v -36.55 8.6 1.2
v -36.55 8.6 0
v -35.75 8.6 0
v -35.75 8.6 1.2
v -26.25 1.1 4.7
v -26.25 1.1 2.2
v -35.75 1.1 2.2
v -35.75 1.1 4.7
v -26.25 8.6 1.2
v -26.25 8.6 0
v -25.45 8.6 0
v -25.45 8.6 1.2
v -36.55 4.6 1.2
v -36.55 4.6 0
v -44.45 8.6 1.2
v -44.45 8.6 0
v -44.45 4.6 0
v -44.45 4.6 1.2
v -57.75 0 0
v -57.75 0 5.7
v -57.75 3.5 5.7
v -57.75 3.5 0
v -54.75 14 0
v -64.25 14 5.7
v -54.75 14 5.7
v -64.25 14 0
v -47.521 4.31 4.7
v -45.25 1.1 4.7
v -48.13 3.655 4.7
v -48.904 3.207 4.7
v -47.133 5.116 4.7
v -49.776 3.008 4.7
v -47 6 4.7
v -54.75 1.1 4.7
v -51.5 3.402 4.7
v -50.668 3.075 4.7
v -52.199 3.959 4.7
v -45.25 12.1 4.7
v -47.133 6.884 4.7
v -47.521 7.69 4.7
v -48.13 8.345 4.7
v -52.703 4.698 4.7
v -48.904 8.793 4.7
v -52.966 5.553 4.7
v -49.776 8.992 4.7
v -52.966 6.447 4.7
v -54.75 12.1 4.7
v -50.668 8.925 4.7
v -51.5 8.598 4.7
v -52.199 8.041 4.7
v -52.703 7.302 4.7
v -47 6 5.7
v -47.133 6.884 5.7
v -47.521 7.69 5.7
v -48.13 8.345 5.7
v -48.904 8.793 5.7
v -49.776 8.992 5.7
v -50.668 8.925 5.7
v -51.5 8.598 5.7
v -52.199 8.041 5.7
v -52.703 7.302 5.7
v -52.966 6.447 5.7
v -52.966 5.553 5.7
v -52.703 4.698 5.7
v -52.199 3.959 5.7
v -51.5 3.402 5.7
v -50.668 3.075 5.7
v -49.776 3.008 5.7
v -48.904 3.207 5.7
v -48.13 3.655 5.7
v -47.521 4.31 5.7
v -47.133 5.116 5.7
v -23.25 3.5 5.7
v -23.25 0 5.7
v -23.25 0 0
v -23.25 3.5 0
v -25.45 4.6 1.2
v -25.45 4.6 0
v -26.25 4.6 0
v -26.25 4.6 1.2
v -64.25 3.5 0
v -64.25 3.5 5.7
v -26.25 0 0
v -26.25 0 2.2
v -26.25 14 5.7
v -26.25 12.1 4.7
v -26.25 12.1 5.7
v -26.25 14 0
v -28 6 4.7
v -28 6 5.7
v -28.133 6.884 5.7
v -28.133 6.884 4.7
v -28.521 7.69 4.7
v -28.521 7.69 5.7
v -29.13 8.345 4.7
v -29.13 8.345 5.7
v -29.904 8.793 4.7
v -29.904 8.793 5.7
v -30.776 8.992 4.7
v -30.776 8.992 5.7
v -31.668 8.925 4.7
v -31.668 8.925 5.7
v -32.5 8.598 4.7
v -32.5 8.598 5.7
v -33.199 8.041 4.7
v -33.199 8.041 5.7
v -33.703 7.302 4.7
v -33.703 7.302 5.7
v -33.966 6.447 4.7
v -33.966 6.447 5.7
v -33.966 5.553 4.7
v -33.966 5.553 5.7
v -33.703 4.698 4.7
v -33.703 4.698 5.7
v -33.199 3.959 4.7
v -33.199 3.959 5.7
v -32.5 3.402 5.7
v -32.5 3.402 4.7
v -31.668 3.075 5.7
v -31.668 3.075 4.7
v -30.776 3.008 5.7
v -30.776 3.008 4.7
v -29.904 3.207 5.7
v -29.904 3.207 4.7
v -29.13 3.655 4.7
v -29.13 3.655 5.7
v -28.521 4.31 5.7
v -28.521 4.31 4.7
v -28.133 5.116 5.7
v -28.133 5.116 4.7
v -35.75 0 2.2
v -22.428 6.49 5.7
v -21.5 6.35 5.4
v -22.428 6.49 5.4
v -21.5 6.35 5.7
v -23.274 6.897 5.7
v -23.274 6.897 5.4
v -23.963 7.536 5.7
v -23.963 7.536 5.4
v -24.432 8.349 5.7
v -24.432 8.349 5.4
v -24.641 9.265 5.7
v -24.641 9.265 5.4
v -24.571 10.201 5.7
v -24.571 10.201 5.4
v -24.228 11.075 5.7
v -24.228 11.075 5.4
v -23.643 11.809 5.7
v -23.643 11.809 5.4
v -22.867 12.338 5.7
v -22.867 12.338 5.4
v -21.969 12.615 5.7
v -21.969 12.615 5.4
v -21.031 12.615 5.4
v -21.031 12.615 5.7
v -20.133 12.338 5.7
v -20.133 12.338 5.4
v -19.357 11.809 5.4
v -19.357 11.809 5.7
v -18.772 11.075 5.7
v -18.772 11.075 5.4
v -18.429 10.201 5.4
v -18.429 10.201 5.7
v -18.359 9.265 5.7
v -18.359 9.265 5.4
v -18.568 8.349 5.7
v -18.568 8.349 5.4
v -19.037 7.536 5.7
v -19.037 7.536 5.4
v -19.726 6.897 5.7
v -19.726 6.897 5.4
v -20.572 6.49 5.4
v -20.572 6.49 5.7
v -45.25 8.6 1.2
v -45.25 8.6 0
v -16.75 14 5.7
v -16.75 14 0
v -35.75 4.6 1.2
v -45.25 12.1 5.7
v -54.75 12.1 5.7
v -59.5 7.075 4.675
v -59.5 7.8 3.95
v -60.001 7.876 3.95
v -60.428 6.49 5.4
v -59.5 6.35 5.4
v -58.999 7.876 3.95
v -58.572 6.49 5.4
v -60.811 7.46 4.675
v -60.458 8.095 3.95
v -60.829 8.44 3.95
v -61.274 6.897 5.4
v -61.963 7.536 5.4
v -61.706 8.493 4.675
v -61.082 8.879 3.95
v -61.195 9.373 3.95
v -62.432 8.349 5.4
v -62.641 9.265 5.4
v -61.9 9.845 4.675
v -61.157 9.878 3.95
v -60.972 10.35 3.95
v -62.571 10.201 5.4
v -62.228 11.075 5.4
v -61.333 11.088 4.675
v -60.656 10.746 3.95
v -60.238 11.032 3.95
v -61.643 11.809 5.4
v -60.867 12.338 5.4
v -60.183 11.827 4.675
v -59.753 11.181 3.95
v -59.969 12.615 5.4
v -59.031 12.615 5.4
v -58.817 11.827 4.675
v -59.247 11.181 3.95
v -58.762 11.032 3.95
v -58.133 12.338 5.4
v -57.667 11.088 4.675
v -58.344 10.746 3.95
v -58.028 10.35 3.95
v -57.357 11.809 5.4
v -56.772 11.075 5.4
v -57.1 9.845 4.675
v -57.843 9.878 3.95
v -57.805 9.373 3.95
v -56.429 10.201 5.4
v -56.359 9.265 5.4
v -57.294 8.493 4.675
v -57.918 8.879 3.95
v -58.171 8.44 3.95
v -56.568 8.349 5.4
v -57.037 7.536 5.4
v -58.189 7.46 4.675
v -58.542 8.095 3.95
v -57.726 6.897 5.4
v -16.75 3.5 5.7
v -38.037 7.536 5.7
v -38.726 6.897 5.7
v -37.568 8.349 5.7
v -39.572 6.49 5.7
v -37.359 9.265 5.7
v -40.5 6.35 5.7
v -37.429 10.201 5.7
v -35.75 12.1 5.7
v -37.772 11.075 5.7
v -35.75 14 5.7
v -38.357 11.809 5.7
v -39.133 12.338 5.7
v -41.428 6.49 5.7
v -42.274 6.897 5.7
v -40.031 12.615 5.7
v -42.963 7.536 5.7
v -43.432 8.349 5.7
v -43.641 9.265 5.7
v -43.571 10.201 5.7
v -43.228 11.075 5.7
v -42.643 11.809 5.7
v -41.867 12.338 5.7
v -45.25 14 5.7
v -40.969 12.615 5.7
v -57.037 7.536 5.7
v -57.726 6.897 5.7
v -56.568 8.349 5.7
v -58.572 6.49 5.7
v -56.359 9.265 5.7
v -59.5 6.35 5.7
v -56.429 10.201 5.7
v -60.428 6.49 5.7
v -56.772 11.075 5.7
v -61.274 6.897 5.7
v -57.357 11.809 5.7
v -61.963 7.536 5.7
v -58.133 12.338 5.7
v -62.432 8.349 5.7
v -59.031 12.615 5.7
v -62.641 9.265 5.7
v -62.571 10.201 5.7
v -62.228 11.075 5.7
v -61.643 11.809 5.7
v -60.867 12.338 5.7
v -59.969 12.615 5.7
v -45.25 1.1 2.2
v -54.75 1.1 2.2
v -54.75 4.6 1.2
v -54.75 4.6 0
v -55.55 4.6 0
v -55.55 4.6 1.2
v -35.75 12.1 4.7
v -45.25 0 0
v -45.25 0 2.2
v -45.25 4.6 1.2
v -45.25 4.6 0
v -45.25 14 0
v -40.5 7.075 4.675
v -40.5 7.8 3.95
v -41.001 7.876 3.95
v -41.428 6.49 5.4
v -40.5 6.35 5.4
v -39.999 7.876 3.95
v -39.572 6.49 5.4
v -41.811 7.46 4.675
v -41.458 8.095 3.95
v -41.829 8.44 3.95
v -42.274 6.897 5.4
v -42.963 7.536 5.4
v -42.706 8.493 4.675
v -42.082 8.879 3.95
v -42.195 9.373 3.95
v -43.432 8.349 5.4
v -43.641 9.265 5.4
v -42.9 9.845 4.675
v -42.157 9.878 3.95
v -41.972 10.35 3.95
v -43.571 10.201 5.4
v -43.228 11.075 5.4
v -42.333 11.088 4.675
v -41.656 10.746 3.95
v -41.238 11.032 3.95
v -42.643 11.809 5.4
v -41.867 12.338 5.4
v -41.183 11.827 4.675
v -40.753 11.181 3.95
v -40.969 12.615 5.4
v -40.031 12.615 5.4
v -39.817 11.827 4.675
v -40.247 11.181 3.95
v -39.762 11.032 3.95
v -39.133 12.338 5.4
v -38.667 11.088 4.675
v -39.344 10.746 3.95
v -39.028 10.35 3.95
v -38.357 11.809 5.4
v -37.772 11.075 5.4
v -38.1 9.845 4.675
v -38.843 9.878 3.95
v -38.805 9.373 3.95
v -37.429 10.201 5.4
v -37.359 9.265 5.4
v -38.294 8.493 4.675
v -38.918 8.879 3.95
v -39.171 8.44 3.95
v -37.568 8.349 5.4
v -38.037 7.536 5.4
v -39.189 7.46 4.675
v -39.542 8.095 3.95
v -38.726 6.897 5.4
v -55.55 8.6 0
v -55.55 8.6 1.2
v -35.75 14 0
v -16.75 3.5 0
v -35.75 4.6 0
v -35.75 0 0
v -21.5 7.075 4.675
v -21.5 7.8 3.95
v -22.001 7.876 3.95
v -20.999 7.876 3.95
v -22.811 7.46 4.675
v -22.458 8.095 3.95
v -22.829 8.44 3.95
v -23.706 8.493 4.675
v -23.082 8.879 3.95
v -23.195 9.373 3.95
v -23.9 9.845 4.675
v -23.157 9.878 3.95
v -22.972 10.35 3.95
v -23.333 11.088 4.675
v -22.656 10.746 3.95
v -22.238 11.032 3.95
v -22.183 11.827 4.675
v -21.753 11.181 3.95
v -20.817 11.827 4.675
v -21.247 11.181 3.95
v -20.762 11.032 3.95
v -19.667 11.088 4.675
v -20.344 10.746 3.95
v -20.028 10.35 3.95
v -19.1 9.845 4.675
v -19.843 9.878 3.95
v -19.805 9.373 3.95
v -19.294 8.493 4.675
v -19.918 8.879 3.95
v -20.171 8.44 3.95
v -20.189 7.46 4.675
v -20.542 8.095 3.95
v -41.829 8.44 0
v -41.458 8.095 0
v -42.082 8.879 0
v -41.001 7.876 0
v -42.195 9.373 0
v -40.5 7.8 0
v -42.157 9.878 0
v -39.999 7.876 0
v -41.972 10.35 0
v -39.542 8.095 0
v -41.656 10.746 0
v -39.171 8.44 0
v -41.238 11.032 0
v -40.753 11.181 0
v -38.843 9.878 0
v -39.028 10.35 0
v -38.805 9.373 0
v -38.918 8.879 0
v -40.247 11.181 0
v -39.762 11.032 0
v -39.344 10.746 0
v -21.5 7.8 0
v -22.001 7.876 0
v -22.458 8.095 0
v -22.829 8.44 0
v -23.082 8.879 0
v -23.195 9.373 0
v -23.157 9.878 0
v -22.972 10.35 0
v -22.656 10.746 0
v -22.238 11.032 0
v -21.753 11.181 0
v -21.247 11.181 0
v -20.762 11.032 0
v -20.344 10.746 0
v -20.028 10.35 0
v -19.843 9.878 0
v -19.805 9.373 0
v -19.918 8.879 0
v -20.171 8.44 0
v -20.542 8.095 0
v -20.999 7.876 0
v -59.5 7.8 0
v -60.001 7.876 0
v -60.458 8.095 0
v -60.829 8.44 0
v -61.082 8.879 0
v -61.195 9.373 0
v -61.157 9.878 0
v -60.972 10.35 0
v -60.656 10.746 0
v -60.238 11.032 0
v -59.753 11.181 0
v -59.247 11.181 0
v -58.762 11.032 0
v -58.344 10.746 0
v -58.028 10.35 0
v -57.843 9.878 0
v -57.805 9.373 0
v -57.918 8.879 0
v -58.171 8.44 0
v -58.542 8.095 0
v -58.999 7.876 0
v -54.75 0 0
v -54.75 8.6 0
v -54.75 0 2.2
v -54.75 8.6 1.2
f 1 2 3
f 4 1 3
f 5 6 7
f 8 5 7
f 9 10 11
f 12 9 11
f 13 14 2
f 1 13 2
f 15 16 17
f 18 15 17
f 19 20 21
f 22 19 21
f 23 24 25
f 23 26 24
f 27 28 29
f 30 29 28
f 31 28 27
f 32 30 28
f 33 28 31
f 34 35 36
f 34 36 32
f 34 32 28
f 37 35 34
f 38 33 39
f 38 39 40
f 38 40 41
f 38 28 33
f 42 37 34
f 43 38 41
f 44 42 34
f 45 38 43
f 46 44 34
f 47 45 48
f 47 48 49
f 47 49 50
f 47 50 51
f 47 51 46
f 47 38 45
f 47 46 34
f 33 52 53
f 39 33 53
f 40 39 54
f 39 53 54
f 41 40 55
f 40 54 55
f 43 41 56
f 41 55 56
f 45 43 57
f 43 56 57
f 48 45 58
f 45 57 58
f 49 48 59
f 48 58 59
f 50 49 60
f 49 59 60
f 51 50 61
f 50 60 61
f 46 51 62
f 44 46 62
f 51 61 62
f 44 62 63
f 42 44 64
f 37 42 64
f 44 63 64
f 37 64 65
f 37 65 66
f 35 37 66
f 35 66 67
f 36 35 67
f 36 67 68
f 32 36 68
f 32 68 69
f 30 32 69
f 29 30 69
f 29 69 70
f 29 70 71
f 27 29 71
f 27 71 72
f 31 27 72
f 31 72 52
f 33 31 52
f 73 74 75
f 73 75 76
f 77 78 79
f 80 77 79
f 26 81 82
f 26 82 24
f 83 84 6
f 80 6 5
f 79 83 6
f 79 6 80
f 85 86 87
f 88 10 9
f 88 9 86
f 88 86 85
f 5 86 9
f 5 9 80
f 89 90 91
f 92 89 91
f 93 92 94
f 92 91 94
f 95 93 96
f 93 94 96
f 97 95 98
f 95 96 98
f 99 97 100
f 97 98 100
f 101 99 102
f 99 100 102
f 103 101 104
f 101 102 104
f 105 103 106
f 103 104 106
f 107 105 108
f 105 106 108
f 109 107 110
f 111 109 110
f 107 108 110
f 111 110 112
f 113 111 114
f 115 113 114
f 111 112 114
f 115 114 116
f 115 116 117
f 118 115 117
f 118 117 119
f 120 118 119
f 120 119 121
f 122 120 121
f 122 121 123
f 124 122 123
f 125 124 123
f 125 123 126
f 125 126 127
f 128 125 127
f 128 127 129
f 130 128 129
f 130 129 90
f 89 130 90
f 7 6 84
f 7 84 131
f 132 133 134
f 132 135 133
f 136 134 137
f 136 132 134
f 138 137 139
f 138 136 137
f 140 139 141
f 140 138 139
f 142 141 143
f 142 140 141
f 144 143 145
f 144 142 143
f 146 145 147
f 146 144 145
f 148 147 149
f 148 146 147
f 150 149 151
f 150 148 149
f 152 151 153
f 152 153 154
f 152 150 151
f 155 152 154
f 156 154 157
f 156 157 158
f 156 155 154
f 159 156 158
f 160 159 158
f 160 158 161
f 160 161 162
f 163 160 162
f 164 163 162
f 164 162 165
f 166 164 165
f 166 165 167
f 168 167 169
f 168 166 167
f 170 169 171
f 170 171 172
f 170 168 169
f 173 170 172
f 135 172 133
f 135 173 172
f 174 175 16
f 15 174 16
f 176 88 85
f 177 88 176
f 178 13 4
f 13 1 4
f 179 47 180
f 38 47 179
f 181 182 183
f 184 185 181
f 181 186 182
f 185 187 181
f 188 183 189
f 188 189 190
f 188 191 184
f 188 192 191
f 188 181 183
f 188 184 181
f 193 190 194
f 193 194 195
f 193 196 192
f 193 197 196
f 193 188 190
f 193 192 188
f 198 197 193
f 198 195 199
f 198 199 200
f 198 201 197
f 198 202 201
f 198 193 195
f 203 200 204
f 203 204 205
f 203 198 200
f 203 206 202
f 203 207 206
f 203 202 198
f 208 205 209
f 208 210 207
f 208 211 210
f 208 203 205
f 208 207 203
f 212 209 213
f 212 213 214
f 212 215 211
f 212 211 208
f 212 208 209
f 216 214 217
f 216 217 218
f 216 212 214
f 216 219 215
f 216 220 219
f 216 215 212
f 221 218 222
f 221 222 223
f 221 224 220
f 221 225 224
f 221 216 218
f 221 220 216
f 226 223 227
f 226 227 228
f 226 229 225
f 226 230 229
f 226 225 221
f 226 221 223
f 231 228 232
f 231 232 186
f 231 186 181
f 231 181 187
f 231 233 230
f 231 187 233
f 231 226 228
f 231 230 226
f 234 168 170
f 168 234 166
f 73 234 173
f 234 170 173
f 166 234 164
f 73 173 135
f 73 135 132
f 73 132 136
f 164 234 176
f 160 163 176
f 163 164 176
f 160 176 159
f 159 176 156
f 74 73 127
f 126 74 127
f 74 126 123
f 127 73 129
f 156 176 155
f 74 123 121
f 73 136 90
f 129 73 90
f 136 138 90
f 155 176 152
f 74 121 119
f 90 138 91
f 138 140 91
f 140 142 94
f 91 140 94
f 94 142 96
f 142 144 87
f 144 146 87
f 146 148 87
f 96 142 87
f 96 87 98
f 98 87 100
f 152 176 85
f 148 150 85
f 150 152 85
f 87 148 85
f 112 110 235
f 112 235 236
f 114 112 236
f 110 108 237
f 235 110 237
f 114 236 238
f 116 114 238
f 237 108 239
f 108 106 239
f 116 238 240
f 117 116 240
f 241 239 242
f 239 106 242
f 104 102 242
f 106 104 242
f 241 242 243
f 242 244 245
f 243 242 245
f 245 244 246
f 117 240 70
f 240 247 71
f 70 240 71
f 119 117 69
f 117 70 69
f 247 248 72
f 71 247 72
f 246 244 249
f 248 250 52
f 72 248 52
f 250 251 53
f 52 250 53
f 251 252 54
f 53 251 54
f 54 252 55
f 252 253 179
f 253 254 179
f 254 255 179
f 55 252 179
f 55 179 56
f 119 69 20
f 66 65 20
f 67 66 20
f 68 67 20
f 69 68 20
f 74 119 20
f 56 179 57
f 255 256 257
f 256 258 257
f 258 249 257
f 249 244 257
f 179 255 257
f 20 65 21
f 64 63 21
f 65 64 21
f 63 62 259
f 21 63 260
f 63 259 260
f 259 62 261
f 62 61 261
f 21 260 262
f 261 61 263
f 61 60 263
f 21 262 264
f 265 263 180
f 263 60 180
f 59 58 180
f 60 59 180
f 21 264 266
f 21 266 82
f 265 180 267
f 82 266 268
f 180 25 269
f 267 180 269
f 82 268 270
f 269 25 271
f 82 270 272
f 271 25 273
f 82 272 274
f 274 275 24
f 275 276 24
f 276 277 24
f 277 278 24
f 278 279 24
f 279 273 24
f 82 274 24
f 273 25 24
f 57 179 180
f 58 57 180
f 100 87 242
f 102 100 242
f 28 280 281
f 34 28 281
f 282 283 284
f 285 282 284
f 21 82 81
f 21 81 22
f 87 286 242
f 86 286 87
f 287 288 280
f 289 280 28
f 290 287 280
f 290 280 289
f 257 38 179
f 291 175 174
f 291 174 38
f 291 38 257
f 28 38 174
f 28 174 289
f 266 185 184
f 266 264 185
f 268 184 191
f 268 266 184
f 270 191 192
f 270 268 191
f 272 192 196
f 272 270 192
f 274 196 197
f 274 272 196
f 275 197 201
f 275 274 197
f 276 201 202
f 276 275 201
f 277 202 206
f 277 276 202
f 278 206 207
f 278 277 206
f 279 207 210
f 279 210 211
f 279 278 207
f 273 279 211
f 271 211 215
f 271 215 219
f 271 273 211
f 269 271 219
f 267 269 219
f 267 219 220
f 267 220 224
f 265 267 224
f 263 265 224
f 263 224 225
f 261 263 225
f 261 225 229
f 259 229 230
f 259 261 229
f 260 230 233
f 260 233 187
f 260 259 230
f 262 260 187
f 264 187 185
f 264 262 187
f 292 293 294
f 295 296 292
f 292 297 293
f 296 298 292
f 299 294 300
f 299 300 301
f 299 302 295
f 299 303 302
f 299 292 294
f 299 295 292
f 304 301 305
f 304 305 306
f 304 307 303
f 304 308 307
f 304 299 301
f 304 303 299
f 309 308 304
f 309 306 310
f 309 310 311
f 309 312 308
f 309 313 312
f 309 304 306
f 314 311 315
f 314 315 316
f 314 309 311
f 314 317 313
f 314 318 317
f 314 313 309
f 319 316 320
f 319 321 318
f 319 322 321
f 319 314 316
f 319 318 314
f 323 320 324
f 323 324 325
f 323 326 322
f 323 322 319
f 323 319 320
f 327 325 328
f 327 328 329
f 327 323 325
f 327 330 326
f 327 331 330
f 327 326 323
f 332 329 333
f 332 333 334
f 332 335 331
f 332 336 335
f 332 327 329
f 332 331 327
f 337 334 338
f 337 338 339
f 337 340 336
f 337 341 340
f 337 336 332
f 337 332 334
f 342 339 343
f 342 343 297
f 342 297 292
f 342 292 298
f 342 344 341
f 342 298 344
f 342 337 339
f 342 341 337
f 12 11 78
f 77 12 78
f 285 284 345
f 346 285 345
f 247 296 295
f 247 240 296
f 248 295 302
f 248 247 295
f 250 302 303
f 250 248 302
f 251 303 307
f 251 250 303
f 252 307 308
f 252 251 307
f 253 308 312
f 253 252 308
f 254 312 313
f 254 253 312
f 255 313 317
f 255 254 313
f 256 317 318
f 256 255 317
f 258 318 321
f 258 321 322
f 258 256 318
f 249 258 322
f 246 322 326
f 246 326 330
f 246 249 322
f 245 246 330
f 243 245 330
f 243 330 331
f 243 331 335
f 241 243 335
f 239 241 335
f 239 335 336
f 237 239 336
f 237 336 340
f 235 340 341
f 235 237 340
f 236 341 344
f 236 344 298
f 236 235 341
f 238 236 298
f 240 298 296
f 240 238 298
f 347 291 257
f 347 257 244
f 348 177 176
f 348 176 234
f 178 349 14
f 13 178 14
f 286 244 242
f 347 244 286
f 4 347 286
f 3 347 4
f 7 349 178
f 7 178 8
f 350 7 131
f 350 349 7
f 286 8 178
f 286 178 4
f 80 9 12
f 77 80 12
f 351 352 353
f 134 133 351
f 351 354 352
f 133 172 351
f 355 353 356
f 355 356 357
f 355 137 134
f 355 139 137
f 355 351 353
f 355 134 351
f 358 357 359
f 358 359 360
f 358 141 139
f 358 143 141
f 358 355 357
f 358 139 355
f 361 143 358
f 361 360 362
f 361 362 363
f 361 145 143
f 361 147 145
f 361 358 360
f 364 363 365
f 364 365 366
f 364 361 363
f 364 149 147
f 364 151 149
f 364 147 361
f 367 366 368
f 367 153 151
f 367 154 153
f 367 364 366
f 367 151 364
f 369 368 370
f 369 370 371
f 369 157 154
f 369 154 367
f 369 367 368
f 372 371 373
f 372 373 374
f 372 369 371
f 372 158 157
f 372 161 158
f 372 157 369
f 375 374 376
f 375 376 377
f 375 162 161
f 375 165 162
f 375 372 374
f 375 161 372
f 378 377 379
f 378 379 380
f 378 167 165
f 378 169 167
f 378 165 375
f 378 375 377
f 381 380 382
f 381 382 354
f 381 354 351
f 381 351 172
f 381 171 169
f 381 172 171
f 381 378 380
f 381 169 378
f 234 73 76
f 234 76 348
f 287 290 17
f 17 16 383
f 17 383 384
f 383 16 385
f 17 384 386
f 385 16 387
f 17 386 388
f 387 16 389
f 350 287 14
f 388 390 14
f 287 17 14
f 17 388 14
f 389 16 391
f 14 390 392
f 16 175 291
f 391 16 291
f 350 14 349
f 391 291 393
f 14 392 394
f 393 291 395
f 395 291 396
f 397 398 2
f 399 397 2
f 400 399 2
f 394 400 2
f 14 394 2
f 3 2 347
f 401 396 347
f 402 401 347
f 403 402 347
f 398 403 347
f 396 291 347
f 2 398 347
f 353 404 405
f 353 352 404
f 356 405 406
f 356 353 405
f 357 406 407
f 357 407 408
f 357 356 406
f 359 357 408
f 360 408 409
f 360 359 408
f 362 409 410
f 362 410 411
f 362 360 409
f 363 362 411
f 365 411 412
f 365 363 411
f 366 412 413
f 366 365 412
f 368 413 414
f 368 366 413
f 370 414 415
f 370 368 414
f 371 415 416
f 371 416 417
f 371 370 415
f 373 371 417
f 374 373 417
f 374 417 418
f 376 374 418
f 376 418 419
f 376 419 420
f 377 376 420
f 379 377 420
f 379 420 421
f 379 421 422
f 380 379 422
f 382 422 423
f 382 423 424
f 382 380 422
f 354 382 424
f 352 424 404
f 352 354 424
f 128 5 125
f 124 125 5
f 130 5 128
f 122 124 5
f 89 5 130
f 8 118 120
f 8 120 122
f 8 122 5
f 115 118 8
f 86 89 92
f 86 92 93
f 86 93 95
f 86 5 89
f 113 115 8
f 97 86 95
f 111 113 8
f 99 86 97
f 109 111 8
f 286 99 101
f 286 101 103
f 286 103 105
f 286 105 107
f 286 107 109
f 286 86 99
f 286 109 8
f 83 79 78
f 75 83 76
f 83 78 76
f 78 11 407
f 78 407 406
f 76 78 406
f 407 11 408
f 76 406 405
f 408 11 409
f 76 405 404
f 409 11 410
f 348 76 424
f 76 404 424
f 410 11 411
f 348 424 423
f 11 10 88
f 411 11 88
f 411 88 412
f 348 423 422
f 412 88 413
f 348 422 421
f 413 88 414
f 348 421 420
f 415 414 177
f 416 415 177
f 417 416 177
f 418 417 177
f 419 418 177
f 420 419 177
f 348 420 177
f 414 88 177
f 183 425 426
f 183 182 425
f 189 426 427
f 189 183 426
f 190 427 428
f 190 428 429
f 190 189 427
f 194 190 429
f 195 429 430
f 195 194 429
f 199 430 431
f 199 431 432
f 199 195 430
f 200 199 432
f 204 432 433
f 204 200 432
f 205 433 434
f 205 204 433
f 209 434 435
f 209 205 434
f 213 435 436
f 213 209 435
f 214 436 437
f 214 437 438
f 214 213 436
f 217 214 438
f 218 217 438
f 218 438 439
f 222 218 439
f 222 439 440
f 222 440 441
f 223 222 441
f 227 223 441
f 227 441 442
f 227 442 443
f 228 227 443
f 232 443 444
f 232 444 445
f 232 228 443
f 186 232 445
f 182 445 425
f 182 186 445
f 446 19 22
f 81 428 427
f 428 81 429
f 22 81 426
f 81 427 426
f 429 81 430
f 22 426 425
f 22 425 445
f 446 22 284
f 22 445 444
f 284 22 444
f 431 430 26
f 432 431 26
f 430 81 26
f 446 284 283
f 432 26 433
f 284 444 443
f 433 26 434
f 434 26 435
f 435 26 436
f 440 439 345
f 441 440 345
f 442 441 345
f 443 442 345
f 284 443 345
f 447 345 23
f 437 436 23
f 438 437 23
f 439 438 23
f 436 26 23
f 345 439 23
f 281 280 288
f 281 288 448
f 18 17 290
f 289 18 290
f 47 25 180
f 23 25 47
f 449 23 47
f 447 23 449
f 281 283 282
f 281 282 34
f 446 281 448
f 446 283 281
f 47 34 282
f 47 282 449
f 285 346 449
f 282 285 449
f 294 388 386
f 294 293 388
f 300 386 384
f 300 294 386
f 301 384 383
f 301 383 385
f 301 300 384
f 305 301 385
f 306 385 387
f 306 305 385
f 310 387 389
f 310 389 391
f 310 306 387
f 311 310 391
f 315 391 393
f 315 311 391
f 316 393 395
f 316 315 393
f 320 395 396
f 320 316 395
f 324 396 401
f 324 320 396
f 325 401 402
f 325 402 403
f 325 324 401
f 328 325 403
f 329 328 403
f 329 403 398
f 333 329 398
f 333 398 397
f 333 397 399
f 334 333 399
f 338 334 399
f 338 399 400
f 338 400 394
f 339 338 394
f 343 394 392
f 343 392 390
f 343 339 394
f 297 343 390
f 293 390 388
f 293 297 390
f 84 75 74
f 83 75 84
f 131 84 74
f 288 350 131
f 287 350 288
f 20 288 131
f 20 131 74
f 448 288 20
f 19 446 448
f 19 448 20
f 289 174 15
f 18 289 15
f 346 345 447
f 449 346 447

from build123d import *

# Parameters (mm, degrees)
SKETCH1_R                                    = 1.5
BOSS_EXTRUDE1_DEPTH                          = 1.2
BOSS_EXTRUDE1_2_DEPTH                        = 1.2
BOSS_EXTRUDE1_3_DEPTH                        = 1.2
SKETCH2_R                                    = 1.5
BOSS_EXTRUDE2_DEPTH                          = 3.5
SKETCH3_R                                    = 1.5
BOSS_EXTRUDE3_DEPTH                          = 1
CSK_FOR_M3_COUNTERSUNK_FLAT_HEAD_SCR_2_COUNT = 2
CSK_FOR_M3_COUNTERSUNK_FLAT_HEAD_SCR_2_PITCH = 19
CSK_FOR_M3_COUNTERSUNK_FLAT_HEAD_SCR_3_COUNT = 2
CSK_FOR_M3_COUNTERSUNK_FLAT_HEAD_SCR_3_PITCH = 38
SKETCH7_R                                    = 3
CUT_EXTRUDE1_DEPTH                           = 67.004185473
SKETCH8_W                                    = 6.5
SKETCH8_H                                    = 3.5
CUT_EXTRUDE2_DEPTH                           = 67.004185473
SKETCH10_W                                   = 9.5
SKETCH10_H                                   = 1.1
CUT_EXTRUDE3_DEPTH                           = 1


with BuildPart() as part:
    # Sketch1 → Boss-Extrude1 (new body)
    with BuildSketch(Plane.XY):
        Polygon((-55.55, 8.6), (-54.75, 8.6), (-54.75, 14), (-64.25, 14), (-64.25, 0), (-54.75, 0), (-54.75, 4.6), (-55.55, 4.6), align=None)
        with Locations((-59.5, 9.5)):
            Circle(SKETCH1_R, mode=Mode.SUBTRACT)
    extrude(amount=BOSS_EXTRUDE1_DEPTH)



with BuildPart() as body_2:
    # Sketch1 → Boss-Extrude1 2 (new body)
    with BuildSketch(Plane.XY):
        Polygon((-45.25, 4.6), (-45.25, 0), (-35.75, 0), (-35.75, 4.6), (-36.55, 4.6), (-36.55, 8.6), (-35.75, 8.6), (-35.75, 14), (-45.25, 14), (-45.25, 8.6), (-44.45, 8.6), (-44.45, 4.6), align=None)
        with Locations((-40.5, 9.5)):
            Circle(SKETCH1_R, mode=Mode.SUBTRACT)
    extrude(amount=BOSS_EXTRUDE1_2_DEPTH)


with BuildPart() as body_3:
    # Sketch1 → Boss-Extrude1 3 (new body)
    with BuildSketch(Plane.XY):
        Polygon((-26.25, 4.6), (-26.25, 0), (-16.75, 0), (-16.75, 14), (-26.25, 14), (-26.25, 8.6), (-25.45, 8.6), (-25.45, 4.6), align=None)
        with Locations((-21.5, 9.5)):
            Circle(SKETCH1_R, mode=Mode.SUBTRACT)
    extrude(amount=BOSS_EXTRUDE1_3_DEPTH)


with BuildPart() as part_1:
    add(part.part)

    add(body_2.part)  # Boss-Extrude2 merges body 2

    add(body_3.part)  # Boss-Extrude2 merges body 3
    # Sketch2 → Boss-Extrude2 (add)
    with BuildSketch(Plane.XY.offset(1.2)):
        Polygon((-54.75, 14), (-64.25, 14), (-64.25, 0), (-16.75, 0), (-16.75, 14), (-26.25, 14), (-26.25, 1.1), (-35.75, 1.1), (-35.75, 14), (-45.25, 14), (-45.25, 1.1), (-54.75, 1.1), align=None)
        with Locations((-59.5, 9.5)):
            Circle(SKETCH2_R, mode=Mode.SUBTRACT)
        with Locations((-40.5, 9.5)):
            Circle(SKETCH2_R, mode=Mode.SUBTRACT)
        with Locations((-21.5, 9.5)):
            Circle(SKETCH2_R, mode=Mode.SUBTRACT)
    extrude(amount=BOSS_EXTRUDE2_DEPTH)

    # Sketch3 → Boss-Extrude3 (add)
    with BuildSketch(Plane.XY.offset(4.7)):
        Polygon((-64.25, 14), (-54.75, 14), (-54.75, 12.1), (-45.25, 12.1), (-45.25, 14), (-35.75, 14), (-35.75, 12.1), (-26.25, 12.1), (-26.25, 14), (-16.75, 14), (-16.75, 0), (-64.25, 0), align=None)
        with Locations((-59.5, 9.5)):
            Circle(SKETCH3_R, mode=Mode.SUBTRACT)
        with Locations((-40.5, 9.5)):
            Circle(SKETCH3_R, mode=Mode.SUBTRACT)
        with Locations((-21.5, 9.5)):
            Circle(SKETCH3_R, mode=Mode.SUBTRACT)
    extrude(amount=BOSS_EXTRUDE3_DEPTH)

    # Sketch6 → CSK for M3 Countersunk Flat Head Screw1 (revolve, cut)
    with BuildSketch(Plane(origin=(-59.5, 9.5, 5.7), x_dir=(0, -1, 0), z_dir=(1, 0, 0))):
        Polygon((0, 0), (0, 5.7), (1.7, 5.7), (1.7, 1.75), (3.15, 0.3), (3.15, 0), align=None)
    csk_for_m3_countersunk_flat_head_screw1 = revolve(axis=Axis((-59.5, 9.5, 12.05), (0, 0, -1)), mode=Mode.SUBTRACT)

    # CSK for M3 Countersunk Flat Head Scr 2: CSK for M3 Countersunk Flat Head Screw1 ×2
    with Locations(*[(i * CSK_FOR_M3_COUNTERSUNK_FLAT_HEAD_SCR_2_PITCH, 0, 0) for i in range(1, CSK_FOR_M3_COUNTERSUNK_FLAT_HEAD_SCR_2_COUNT)]):
        add(csk_for_m3_countersunk_flat_head_screw1, mode=Mode.SUBTRACT)

    # CSK for M3 Countersunk Flat Head Scr 3: CSK for M3 Countersunk Flat Head Screw1 ×2
    with Locations(*[(i * CSK_FOR_M3_COUNTERSUNK_FLAT_HEAD_SCR_3_PITCH, 0, 0) for i in range(1, CSK_FOR_M3_COUNTERSUNK_FLAT_HEAD_SCR_3_COUNT)]):
        add(csk_for_m3_countersunk_flat_head_screw1, mode=Mode.SUBTRACT)

    # Sketch7 → Cut-Extrude1 (cut, through all)
    with BuildSketch(Plane.XY.offset(5.7)):
        with Locations((-50, 6)):
            Circle(SKETCH7_R)
        with Locations((-31, 6)):
            Circle(SKETCH7_R)
    extrude(amount=-CUT_EXTRUDE1_DEPTH, mode=Mode.SUBTRACT)

    # Sketch8 → Cut-Extrude2 (cut, through all)
    with BuildSketch(Plane.XY.offset(5.7)):
        with Locations((-61, 1.75)):
            Rectangle(SKETCH8_W, SKETCH8_H)
        with Locations((-20, 1.75)):
            Rectangle(SKETCH8_W, SKETCH8_H)
    extrude(amount=-CUT_EXTRUDE2_DEPTH, mode=Mode.SUBTRACT)

    # Sketch10 → Cut-Extrude3 (cut)
    with BuildSketch(Plane(origin=(0, 0, 1.2), x_dir=(-1, 0, 0), z_dir=(0, 0, -1))):
        with Locations((31, 0.55)):
            Rectangle(SKETCH10_W, SKETCH10_H)
        with Locations((50, 0.55)):
            Rectangle(SKETCH10_W, SKETCH10_H)
    extrude(amount=-CUT_EXTRUDE3_DEPTH, mode=Mode.SUBTRACT)


solid = part_1.part
